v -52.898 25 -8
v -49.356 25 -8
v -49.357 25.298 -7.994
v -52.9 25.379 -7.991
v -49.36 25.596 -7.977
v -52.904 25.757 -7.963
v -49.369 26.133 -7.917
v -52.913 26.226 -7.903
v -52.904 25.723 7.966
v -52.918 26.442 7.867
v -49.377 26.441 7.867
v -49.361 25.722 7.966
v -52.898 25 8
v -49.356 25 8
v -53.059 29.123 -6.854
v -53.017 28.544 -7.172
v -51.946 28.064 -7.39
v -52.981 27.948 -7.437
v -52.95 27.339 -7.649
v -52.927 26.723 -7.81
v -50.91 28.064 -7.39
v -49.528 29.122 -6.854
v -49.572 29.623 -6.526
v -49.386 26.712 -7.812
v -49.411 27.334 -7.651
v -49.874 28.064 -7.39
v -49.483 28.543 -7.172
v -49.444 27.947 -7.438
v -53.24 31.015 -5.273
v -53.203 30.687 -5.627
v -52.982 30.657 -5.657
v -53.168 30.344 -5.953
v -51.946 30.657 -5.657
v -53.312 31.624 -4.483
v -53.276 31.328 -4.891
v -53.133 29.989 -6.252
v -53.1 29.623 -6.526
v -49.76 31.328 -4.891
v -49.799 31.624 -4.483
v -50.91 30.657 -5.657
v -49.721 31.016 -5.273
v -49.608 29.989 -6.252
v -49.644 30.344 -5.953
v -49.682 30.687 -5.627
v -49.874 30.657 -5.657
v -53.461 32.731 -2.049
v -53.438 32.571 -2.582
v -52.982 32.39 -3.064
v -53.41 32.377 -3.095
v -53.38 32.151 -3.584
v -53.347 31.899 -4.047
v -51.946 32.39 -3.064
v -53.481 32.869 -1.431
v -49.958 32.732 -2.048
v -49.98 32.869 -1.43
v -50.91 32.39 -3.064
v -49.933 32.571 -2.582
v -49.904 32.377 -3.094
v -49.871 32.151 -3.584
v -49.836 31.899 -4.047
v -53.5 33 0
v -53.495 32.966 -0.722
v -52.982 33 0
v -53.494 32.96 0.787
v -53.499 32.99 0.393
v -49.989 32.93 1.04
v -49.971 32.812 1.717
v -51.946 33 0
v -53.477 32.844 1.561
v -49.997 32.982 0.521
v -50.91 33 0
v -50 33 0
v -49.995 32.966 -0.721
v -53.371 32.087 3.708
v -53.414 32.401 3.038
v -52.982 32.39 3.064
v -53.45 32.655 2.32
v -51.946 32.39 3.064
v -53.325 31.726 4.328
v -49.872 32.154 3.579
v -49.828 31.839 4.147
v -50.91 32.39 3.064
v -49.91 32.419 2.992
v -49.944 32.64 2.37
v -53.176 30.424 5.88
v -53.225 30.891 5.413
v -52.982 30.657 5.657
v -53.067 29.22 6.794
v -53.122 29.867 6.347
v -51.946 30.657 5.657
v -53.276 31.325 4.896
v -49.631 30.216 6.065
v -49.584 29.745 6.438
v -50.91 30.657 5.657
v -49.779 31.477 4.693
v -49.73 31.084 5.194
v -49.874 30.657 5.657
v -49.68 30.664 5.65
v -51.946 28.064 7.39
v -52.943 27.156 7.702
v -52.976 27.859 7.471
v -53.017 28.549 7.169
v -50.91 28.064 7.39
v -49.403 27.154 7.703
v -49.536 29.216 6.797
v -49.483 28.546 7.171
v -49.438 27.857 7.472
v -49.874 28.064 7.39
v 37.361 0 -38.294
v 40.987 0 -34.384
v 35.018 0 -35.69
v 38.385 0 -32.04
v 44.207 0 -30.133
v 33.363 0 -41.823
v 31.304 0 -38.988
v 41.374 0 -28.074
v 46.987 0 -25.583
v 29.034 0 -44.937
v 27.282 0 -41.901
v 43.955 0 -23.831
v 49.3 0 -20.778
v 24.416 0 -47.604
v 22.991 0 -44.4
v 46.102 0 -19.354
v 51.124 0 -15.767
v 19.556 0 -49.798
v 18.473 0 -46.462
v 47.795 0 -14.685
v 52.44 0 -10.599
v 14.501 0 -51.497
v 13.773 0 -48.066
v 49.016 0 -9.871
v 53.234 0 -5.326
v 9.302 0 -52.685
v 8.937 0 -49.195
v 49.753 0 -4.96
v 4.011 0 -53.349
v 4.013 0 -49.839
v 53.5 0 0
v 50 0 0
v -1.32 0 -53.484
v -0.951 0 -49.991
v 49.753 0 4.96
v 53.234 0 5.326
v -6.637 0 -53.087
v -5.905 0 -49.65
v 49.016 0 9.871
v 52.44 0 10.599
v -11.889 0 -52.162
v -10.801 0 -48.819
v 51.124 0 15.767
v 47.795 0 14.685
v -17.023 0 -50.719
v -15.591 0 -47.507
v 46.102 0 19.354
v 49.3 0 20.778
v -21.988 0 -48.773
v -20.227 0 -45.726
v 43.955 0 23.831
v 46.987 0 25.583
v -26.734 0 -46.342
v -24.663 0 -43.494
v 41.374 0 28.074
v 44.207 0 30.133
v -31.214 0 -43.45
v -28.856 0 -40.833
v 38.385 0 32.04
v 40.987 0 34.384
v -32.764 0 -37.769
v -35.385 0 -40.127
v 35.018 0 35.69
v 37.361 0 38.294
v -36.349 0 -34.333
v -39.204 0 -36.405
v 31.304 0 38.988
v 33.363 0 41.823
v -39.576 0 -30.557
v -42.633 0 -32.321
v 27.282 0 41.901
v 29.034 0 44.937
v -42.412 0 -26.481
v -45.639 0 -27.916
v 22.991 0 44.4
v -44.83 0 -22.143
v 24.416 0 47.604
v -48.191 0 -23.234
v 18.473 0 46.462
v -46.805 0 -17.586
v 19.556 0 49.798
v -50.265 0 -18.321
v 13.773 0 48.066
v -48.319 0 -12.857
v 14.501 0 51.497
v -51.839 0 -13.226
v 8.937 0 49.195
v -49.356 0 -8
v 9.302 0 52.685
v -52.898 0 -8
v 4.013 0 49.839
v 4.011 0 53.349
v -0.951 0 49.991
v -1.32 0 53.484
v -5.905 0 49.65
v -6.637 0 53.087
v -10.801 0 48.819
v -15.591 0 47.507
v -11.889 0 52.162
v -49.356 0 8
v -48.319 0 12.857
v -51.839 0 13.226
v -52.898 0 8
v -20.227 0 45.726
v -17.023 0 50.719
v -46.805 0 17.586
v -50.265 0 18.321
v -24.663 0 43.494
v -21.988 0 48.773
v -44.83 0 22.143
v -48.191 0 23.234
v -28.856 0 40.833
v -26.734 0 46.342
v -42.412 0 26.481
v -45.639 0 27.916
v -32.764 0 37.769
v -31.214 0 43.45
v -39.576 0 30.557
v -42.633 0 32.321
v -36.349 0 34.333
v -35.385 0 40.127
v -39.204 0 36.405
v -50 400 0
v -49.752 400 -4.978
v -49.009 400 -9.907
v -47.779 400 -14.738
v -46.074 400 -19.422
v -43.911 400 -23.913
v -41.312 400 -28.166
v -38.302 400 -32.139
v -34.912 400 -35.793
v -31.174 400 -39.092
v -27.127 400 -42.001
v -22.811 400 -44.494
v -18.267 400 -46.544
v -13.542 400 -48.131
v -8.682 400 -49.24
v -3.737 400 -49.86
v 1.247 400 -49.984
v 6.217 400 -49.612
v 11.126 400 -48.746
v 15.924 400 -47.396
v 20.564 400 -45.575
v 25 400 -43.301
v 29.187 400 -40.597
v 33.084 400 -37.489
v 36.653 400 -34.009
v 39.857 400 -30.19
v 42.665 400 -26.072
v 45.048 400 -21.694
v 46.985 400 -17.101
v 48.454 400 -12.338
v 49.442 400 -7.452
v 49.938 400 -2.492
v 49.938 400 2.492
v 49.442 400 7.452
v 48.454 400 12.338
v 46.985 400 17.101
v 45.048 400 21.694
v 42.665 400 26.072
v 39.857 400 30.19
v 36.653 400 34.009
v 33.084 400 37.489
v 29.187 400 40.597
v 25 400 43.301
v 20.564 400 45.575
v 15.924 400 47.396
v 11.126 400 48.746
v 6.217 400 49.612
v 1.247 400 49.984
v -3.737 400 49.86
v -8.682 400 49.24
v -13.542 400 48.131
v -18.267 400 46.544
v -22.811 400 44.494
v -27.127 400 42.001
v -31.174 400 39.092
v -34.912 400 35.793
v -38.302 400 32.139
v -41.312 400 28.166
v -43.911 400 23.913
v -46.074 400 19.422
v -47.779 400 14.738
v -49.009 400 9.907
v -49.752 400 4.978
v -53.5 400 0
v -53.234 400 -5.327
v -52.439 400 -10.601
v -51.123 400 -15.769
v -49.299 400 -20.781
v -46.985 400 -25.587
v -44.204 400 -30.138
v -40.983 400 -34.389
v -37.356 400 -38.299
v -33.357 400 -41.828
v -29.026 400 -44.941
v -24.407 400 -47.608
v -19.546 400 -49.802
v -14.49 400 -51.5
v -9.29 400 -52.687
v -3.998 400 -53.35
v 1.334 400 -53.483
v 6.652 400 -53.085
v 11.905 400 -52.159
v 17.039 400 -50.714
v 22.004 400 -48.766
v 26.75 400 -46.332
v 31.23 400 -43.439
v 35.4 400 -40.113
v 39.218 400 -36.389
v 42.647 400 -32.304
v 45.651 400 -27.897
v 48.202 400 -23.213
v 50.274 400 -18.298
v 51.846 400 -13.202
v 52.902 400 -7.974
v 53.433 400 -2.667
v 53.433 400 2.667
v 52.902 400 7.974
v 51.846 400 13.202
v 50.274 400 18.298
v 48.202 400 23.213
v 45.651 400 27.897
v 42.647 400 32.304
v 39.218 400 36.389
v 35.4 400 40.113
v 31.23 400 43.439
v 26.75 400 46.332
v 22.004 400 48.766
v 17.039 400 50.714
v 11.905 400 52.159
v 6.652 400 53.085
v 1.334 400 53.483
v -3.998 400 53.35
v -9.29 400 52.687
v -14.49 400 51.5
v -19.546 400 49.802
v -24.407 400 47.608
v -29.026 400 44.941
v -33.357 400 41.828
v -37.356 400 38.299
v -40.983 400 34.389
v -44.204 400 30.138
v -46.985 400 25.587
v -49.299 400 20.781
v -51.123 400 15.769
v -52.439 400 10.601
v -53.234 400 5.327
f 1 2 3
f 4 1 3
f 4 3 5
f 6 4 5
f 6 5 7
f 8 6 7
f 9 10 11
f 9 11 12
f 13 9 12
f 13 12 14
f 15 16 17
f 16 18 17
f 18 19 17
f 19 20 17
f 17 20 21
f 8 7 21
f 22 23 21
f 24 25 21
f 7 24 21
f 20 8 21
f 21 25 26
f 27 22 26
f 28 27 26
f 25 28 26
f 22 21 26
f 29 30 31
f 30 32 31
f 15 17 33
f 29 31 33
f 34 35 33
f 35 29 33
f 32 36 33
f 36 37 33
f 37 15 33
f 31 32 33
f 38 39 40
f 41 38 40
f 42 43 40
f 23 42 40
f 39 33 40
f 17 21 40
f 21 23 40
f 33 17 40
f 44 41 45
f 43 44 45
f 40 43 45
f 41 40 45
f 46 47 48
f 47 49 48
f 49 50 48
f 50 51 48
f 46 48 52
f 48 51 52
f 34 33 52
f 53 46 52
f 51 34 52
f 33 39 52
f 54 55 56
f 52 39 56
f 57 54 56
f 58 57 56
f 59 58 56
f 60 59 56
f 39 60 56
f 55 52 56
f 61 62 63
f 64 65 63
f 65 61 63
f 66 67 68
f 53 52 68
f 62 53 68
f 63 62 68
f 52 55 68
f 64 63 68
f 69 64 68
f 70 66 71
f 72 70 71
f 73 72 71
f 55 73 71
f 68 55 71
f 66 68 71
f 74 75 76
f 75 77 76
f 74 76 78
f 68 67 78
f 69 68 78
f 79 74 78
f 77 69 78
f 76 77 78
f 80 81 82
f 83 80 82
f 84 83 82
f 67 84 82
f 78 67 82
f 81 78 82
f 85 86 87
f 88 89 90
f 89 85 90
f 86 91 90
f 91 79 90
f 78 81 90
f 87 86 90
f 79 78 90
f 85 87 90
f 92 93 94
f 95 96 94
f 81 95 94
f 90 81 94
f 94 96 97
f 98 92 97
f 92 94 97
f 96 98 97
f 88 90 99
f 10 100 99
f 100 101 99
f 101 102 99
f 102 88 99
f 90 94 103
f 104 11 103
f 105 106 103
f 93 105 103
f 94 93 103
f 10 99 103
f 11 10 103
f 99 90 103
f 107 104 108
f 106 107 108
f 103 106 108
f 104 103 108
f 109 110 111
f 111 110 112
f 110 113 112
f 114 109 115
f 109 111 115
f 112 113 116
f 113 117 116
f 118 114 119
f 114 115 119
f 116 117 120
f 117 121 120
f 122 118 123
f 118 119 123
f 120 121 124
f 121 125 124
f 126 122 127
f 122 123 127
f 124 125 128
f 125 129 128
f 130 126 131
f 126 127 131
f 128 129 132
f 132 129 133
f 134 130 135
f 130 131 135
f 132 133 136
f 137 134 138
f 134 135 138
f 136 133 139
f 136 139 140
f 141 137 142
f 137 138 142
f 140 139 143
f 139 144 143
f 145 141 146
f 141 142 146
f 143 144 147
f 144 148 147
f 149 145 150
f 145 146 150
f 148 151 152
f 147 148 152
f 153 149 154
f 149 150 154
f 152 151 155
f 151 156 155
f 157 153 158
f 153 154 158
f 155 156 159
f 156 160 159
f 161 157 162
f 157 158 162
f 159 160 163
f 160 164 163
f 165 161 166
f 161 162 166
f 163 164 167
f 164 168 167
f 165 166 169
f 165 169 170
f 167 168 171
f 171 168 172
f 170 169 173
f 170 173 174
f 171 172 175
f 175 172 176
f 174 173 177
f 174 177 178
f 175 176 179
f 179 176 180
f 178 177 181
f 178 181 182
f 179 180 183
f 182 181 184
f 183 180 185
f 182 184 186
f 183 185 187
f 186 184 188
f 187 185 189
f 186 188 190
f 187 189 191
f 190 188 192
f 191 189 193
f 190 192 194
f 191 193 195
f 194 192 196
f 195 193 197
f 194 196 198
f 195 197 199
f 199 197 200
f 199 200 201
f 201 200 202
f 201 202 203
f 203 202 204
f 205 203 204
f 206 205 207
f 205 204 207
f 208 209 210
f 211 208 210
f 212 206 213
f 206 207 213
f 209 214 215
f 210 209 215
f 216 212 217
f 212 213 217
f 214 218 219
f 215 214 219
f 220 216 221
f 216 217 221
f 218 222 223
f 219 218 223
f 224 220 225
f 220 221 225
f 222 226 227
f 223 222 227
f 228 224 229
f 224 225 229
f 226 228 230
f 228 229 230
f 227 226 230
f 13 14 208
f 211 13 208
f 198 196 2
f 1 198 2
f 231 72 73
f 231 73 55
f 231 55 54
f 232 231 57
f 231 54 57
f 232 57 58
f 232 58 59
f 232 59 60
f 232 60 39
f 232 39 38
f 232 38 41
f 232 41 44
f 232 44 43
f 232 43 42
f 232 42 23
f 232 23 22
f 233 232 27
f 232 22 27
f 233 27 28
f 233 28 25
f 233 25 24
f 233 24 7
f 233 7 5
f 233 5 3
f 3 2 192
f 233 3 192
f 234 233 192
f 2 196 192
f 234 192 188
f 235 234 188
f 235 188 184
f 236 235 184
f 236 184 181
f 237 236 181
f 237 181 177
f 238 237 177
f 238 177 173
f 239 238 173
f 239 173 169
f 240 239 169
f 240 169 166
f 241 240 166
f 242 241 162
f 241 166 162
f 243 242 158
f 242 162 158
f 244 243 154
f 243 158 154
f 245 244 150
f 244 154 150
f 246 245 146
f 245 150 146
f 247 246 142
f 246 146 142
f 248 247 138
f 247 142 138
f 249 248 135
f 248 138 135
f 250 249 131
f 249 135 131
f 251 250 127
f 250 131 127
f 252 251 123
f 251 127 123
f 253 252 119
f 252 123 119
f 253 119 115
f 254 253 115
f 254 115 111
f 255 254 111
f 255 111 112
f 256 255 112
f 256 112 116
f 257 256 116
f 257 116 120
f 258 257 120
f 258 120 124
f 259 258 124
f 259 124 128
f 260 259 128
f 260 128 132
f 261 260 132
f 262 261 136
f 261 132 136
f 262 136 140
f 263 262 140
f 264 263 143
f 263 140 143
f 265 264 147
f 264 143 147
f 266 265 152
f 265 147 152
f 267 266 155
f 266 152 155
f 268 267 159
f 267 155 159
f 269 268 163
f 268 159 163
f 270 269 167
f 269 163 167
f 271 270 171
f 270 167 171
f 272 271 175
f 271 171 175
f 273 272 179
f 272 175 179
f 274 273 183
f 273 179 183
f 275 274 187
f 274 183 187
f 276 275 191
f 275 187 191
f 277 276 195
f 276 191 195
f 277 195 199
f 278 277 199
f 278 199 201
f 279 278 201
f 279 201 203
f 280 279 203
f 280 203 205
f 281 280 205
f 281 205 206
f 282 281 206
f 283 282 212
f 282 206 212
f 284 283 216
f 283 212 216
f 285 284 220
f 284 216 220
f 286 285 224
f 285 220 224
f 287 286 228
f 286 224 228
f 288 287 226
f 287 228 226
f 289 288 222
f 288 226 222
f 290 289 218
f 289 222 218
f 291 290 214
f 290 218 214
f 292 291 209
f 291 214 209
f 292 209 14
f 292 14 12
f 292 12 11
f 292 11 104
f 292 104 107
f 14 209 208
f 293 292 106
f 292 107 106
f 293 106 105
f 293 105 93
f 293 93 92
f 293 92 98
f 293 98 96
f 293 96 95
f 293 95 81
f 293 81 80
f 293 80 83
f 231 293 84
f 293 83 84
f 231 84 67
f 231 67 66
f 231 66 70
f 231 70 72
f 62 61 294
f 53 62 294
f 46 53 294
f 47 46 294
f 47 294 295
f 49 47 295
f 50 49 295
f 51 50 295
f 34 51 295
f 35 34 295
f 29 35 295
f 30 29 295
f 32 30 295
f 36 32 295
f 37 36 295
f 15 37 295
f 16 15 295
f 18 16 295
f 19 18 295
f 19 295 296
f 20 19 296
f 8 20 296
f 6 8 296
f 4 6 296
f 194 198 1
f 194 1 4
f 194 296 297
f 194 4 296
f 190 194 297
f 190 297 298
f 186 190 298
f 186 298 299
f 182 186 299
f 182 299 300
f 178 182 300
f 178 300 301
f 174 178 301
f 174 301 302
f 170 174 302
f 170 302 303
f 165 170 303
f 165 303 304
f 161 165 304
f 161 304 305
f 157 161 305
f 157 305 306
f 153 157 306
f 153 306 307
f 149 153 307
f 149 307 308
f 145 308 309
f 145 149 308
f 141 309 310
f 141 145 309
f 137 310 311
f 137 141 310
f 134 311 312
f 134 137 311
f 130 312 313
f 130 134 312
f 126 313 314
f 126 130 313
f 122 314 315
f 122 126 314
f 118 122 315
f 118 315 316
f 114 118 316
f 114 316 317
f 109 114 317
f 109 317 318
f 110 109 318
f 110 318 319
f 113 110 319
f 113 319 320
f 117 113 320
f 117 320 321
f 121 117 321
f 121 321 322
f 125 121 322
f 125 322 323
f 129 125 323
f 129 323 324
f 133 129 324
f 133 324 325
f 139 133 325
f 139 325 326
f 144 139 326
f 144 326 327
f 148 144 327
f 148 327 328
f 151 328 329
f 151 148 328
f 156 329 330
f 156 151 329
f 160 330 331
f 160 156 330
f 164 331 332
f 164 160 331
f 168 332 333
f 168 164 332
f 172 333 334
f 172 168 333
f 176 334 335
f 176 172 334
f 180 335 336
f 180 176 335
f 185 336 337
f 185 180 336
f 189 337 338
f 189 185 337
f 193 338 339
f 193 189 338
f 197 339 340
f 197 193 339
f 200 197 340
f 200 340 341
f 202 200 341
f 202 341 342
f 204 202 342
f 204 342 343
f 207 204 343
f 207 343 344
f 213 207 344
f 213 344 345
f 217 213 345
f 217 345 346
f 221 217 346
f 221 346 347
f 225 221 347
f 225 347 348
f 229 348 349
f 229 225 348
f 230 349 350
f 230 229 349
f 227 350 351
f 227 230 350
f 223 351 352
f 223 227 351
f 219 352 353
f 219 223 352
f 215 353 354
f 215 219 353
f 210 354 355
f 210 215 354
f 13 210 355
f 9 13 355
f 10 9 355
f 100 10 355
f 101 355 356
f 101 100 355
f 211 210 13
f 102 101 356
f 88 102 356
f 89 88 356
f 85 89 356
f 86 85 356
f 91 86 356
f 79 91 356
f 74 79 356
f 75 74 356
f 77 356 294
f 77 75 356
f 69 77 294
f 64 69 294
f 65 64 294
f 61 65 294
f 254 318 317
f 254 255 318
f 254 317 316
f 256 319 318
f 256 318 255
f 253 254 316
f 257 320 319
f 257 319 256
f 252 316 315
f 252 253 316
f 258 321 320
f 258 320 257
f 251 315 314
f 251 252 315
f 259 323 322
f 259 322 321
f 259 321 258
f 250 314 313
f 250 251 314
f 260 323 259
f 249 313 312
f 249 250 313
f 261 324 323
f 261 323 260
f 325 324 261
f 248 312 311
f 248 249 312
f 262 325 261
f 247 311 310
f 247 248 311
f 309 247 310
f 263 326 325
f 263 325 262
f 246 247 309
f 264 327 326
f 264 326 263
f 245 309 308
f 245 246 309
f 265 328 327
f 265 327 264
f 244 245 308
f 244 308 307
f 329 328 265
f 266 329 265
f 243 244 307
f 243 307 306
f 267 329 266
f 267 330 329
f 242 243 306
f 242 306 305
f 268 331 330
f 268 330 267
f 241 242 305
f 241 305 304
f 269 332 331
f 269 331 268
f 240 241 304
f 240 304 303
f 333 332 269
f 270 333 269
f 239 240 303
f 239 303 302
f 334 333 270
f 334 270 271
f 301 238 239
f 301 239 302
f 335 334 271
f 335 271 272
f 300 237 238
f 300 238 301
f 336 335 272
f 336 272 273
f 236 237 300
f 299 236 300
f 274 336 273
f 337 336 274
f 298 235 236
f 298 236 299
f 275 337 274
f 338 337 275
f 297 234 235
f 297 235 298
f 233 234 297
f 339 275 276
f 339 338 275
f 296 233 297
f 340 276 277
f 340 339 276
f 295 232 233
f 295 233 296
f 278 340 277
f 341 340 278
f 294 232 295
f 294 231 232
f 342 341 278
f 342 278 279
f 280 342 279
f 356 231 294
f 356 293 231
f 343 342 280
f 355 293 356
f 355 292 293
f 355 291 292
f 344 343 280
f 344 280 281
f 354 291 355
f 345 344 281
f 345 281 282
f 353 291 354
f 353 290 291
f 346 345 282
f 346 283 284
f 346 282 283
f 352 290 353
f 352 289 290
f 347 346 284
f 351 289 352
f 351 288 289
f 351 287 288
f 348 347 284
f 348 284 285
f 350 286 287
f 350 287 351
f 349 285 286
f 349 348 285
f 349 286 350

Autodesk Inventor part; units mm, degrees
ref_plane "YZ Plane" through (0, 0, 0) normal (1, 0, 0) x (0, 1, 0)
ref_plane "XZ Plane" through (0, 0, 0) normal (0, 1, 0) x (-1, 0, 0)
ref_plane "XY Plane" through (0, 0, 0) normal (0, 0, 1) x (1, 0, 0)
sketch "Sketch1" plane through (0, 0, 0) normal (0, 1, 0) x (-1, 0, 0)
  circle A0 centre (0, 0) radius 50
  circle A1 centre (0, 0) radius 53.5
  dimension "d0" = 100
  dimension "d1" = 3.5
extrude "Extrusion1" add sketch "Sketch1" along normal blind 400
sketch "Sketch3" plane through (0, 0, 0) normal (1, 0, 0) x (0, 1, 0)
  spline S0 degree 3 poles (25, -8) (26.0064, -8) (27.0786, -7.7985) (29.0491, -6.9816) (29.9475, -6.3662) (31.3662, -4.9476) (31.9816, -4.0491) (32.7985, -2.0786) (33, -1.0063) (33, 1.0063) (32.7985, 2.0786) (31.9816, 4.0491) (31.3662, 4.9476) (29.9475, 6.3662) (29.0491, 6.9816) (27.0786, 7.7985) (26.0064, 8) (25, 8) knots -2.41526 -2.41526 -2.41526 -2.41526 -2.113349 -2.113349 -1.811438 -1.811438 -1.509534 -1.509534 -1.20763 -1.20763 -0.905726 -0.905726 -0.603822 -0.603822 -0.301911 -0.301911 0 0 0 0 projected
  line L0 (25, 8) -> (0, 8) projected
  line L1 (0, -8) -> (25, -8) projected
  line L2 (0, 8) -> (0, -8)
  line L3 (0, 53.5) -> (0, -53.5) projected
  point P0 (0, 0)
extrude "Extrusion2" cut sketch "Sketch3" against normal through all
properties part number "Crusher_Tube"
